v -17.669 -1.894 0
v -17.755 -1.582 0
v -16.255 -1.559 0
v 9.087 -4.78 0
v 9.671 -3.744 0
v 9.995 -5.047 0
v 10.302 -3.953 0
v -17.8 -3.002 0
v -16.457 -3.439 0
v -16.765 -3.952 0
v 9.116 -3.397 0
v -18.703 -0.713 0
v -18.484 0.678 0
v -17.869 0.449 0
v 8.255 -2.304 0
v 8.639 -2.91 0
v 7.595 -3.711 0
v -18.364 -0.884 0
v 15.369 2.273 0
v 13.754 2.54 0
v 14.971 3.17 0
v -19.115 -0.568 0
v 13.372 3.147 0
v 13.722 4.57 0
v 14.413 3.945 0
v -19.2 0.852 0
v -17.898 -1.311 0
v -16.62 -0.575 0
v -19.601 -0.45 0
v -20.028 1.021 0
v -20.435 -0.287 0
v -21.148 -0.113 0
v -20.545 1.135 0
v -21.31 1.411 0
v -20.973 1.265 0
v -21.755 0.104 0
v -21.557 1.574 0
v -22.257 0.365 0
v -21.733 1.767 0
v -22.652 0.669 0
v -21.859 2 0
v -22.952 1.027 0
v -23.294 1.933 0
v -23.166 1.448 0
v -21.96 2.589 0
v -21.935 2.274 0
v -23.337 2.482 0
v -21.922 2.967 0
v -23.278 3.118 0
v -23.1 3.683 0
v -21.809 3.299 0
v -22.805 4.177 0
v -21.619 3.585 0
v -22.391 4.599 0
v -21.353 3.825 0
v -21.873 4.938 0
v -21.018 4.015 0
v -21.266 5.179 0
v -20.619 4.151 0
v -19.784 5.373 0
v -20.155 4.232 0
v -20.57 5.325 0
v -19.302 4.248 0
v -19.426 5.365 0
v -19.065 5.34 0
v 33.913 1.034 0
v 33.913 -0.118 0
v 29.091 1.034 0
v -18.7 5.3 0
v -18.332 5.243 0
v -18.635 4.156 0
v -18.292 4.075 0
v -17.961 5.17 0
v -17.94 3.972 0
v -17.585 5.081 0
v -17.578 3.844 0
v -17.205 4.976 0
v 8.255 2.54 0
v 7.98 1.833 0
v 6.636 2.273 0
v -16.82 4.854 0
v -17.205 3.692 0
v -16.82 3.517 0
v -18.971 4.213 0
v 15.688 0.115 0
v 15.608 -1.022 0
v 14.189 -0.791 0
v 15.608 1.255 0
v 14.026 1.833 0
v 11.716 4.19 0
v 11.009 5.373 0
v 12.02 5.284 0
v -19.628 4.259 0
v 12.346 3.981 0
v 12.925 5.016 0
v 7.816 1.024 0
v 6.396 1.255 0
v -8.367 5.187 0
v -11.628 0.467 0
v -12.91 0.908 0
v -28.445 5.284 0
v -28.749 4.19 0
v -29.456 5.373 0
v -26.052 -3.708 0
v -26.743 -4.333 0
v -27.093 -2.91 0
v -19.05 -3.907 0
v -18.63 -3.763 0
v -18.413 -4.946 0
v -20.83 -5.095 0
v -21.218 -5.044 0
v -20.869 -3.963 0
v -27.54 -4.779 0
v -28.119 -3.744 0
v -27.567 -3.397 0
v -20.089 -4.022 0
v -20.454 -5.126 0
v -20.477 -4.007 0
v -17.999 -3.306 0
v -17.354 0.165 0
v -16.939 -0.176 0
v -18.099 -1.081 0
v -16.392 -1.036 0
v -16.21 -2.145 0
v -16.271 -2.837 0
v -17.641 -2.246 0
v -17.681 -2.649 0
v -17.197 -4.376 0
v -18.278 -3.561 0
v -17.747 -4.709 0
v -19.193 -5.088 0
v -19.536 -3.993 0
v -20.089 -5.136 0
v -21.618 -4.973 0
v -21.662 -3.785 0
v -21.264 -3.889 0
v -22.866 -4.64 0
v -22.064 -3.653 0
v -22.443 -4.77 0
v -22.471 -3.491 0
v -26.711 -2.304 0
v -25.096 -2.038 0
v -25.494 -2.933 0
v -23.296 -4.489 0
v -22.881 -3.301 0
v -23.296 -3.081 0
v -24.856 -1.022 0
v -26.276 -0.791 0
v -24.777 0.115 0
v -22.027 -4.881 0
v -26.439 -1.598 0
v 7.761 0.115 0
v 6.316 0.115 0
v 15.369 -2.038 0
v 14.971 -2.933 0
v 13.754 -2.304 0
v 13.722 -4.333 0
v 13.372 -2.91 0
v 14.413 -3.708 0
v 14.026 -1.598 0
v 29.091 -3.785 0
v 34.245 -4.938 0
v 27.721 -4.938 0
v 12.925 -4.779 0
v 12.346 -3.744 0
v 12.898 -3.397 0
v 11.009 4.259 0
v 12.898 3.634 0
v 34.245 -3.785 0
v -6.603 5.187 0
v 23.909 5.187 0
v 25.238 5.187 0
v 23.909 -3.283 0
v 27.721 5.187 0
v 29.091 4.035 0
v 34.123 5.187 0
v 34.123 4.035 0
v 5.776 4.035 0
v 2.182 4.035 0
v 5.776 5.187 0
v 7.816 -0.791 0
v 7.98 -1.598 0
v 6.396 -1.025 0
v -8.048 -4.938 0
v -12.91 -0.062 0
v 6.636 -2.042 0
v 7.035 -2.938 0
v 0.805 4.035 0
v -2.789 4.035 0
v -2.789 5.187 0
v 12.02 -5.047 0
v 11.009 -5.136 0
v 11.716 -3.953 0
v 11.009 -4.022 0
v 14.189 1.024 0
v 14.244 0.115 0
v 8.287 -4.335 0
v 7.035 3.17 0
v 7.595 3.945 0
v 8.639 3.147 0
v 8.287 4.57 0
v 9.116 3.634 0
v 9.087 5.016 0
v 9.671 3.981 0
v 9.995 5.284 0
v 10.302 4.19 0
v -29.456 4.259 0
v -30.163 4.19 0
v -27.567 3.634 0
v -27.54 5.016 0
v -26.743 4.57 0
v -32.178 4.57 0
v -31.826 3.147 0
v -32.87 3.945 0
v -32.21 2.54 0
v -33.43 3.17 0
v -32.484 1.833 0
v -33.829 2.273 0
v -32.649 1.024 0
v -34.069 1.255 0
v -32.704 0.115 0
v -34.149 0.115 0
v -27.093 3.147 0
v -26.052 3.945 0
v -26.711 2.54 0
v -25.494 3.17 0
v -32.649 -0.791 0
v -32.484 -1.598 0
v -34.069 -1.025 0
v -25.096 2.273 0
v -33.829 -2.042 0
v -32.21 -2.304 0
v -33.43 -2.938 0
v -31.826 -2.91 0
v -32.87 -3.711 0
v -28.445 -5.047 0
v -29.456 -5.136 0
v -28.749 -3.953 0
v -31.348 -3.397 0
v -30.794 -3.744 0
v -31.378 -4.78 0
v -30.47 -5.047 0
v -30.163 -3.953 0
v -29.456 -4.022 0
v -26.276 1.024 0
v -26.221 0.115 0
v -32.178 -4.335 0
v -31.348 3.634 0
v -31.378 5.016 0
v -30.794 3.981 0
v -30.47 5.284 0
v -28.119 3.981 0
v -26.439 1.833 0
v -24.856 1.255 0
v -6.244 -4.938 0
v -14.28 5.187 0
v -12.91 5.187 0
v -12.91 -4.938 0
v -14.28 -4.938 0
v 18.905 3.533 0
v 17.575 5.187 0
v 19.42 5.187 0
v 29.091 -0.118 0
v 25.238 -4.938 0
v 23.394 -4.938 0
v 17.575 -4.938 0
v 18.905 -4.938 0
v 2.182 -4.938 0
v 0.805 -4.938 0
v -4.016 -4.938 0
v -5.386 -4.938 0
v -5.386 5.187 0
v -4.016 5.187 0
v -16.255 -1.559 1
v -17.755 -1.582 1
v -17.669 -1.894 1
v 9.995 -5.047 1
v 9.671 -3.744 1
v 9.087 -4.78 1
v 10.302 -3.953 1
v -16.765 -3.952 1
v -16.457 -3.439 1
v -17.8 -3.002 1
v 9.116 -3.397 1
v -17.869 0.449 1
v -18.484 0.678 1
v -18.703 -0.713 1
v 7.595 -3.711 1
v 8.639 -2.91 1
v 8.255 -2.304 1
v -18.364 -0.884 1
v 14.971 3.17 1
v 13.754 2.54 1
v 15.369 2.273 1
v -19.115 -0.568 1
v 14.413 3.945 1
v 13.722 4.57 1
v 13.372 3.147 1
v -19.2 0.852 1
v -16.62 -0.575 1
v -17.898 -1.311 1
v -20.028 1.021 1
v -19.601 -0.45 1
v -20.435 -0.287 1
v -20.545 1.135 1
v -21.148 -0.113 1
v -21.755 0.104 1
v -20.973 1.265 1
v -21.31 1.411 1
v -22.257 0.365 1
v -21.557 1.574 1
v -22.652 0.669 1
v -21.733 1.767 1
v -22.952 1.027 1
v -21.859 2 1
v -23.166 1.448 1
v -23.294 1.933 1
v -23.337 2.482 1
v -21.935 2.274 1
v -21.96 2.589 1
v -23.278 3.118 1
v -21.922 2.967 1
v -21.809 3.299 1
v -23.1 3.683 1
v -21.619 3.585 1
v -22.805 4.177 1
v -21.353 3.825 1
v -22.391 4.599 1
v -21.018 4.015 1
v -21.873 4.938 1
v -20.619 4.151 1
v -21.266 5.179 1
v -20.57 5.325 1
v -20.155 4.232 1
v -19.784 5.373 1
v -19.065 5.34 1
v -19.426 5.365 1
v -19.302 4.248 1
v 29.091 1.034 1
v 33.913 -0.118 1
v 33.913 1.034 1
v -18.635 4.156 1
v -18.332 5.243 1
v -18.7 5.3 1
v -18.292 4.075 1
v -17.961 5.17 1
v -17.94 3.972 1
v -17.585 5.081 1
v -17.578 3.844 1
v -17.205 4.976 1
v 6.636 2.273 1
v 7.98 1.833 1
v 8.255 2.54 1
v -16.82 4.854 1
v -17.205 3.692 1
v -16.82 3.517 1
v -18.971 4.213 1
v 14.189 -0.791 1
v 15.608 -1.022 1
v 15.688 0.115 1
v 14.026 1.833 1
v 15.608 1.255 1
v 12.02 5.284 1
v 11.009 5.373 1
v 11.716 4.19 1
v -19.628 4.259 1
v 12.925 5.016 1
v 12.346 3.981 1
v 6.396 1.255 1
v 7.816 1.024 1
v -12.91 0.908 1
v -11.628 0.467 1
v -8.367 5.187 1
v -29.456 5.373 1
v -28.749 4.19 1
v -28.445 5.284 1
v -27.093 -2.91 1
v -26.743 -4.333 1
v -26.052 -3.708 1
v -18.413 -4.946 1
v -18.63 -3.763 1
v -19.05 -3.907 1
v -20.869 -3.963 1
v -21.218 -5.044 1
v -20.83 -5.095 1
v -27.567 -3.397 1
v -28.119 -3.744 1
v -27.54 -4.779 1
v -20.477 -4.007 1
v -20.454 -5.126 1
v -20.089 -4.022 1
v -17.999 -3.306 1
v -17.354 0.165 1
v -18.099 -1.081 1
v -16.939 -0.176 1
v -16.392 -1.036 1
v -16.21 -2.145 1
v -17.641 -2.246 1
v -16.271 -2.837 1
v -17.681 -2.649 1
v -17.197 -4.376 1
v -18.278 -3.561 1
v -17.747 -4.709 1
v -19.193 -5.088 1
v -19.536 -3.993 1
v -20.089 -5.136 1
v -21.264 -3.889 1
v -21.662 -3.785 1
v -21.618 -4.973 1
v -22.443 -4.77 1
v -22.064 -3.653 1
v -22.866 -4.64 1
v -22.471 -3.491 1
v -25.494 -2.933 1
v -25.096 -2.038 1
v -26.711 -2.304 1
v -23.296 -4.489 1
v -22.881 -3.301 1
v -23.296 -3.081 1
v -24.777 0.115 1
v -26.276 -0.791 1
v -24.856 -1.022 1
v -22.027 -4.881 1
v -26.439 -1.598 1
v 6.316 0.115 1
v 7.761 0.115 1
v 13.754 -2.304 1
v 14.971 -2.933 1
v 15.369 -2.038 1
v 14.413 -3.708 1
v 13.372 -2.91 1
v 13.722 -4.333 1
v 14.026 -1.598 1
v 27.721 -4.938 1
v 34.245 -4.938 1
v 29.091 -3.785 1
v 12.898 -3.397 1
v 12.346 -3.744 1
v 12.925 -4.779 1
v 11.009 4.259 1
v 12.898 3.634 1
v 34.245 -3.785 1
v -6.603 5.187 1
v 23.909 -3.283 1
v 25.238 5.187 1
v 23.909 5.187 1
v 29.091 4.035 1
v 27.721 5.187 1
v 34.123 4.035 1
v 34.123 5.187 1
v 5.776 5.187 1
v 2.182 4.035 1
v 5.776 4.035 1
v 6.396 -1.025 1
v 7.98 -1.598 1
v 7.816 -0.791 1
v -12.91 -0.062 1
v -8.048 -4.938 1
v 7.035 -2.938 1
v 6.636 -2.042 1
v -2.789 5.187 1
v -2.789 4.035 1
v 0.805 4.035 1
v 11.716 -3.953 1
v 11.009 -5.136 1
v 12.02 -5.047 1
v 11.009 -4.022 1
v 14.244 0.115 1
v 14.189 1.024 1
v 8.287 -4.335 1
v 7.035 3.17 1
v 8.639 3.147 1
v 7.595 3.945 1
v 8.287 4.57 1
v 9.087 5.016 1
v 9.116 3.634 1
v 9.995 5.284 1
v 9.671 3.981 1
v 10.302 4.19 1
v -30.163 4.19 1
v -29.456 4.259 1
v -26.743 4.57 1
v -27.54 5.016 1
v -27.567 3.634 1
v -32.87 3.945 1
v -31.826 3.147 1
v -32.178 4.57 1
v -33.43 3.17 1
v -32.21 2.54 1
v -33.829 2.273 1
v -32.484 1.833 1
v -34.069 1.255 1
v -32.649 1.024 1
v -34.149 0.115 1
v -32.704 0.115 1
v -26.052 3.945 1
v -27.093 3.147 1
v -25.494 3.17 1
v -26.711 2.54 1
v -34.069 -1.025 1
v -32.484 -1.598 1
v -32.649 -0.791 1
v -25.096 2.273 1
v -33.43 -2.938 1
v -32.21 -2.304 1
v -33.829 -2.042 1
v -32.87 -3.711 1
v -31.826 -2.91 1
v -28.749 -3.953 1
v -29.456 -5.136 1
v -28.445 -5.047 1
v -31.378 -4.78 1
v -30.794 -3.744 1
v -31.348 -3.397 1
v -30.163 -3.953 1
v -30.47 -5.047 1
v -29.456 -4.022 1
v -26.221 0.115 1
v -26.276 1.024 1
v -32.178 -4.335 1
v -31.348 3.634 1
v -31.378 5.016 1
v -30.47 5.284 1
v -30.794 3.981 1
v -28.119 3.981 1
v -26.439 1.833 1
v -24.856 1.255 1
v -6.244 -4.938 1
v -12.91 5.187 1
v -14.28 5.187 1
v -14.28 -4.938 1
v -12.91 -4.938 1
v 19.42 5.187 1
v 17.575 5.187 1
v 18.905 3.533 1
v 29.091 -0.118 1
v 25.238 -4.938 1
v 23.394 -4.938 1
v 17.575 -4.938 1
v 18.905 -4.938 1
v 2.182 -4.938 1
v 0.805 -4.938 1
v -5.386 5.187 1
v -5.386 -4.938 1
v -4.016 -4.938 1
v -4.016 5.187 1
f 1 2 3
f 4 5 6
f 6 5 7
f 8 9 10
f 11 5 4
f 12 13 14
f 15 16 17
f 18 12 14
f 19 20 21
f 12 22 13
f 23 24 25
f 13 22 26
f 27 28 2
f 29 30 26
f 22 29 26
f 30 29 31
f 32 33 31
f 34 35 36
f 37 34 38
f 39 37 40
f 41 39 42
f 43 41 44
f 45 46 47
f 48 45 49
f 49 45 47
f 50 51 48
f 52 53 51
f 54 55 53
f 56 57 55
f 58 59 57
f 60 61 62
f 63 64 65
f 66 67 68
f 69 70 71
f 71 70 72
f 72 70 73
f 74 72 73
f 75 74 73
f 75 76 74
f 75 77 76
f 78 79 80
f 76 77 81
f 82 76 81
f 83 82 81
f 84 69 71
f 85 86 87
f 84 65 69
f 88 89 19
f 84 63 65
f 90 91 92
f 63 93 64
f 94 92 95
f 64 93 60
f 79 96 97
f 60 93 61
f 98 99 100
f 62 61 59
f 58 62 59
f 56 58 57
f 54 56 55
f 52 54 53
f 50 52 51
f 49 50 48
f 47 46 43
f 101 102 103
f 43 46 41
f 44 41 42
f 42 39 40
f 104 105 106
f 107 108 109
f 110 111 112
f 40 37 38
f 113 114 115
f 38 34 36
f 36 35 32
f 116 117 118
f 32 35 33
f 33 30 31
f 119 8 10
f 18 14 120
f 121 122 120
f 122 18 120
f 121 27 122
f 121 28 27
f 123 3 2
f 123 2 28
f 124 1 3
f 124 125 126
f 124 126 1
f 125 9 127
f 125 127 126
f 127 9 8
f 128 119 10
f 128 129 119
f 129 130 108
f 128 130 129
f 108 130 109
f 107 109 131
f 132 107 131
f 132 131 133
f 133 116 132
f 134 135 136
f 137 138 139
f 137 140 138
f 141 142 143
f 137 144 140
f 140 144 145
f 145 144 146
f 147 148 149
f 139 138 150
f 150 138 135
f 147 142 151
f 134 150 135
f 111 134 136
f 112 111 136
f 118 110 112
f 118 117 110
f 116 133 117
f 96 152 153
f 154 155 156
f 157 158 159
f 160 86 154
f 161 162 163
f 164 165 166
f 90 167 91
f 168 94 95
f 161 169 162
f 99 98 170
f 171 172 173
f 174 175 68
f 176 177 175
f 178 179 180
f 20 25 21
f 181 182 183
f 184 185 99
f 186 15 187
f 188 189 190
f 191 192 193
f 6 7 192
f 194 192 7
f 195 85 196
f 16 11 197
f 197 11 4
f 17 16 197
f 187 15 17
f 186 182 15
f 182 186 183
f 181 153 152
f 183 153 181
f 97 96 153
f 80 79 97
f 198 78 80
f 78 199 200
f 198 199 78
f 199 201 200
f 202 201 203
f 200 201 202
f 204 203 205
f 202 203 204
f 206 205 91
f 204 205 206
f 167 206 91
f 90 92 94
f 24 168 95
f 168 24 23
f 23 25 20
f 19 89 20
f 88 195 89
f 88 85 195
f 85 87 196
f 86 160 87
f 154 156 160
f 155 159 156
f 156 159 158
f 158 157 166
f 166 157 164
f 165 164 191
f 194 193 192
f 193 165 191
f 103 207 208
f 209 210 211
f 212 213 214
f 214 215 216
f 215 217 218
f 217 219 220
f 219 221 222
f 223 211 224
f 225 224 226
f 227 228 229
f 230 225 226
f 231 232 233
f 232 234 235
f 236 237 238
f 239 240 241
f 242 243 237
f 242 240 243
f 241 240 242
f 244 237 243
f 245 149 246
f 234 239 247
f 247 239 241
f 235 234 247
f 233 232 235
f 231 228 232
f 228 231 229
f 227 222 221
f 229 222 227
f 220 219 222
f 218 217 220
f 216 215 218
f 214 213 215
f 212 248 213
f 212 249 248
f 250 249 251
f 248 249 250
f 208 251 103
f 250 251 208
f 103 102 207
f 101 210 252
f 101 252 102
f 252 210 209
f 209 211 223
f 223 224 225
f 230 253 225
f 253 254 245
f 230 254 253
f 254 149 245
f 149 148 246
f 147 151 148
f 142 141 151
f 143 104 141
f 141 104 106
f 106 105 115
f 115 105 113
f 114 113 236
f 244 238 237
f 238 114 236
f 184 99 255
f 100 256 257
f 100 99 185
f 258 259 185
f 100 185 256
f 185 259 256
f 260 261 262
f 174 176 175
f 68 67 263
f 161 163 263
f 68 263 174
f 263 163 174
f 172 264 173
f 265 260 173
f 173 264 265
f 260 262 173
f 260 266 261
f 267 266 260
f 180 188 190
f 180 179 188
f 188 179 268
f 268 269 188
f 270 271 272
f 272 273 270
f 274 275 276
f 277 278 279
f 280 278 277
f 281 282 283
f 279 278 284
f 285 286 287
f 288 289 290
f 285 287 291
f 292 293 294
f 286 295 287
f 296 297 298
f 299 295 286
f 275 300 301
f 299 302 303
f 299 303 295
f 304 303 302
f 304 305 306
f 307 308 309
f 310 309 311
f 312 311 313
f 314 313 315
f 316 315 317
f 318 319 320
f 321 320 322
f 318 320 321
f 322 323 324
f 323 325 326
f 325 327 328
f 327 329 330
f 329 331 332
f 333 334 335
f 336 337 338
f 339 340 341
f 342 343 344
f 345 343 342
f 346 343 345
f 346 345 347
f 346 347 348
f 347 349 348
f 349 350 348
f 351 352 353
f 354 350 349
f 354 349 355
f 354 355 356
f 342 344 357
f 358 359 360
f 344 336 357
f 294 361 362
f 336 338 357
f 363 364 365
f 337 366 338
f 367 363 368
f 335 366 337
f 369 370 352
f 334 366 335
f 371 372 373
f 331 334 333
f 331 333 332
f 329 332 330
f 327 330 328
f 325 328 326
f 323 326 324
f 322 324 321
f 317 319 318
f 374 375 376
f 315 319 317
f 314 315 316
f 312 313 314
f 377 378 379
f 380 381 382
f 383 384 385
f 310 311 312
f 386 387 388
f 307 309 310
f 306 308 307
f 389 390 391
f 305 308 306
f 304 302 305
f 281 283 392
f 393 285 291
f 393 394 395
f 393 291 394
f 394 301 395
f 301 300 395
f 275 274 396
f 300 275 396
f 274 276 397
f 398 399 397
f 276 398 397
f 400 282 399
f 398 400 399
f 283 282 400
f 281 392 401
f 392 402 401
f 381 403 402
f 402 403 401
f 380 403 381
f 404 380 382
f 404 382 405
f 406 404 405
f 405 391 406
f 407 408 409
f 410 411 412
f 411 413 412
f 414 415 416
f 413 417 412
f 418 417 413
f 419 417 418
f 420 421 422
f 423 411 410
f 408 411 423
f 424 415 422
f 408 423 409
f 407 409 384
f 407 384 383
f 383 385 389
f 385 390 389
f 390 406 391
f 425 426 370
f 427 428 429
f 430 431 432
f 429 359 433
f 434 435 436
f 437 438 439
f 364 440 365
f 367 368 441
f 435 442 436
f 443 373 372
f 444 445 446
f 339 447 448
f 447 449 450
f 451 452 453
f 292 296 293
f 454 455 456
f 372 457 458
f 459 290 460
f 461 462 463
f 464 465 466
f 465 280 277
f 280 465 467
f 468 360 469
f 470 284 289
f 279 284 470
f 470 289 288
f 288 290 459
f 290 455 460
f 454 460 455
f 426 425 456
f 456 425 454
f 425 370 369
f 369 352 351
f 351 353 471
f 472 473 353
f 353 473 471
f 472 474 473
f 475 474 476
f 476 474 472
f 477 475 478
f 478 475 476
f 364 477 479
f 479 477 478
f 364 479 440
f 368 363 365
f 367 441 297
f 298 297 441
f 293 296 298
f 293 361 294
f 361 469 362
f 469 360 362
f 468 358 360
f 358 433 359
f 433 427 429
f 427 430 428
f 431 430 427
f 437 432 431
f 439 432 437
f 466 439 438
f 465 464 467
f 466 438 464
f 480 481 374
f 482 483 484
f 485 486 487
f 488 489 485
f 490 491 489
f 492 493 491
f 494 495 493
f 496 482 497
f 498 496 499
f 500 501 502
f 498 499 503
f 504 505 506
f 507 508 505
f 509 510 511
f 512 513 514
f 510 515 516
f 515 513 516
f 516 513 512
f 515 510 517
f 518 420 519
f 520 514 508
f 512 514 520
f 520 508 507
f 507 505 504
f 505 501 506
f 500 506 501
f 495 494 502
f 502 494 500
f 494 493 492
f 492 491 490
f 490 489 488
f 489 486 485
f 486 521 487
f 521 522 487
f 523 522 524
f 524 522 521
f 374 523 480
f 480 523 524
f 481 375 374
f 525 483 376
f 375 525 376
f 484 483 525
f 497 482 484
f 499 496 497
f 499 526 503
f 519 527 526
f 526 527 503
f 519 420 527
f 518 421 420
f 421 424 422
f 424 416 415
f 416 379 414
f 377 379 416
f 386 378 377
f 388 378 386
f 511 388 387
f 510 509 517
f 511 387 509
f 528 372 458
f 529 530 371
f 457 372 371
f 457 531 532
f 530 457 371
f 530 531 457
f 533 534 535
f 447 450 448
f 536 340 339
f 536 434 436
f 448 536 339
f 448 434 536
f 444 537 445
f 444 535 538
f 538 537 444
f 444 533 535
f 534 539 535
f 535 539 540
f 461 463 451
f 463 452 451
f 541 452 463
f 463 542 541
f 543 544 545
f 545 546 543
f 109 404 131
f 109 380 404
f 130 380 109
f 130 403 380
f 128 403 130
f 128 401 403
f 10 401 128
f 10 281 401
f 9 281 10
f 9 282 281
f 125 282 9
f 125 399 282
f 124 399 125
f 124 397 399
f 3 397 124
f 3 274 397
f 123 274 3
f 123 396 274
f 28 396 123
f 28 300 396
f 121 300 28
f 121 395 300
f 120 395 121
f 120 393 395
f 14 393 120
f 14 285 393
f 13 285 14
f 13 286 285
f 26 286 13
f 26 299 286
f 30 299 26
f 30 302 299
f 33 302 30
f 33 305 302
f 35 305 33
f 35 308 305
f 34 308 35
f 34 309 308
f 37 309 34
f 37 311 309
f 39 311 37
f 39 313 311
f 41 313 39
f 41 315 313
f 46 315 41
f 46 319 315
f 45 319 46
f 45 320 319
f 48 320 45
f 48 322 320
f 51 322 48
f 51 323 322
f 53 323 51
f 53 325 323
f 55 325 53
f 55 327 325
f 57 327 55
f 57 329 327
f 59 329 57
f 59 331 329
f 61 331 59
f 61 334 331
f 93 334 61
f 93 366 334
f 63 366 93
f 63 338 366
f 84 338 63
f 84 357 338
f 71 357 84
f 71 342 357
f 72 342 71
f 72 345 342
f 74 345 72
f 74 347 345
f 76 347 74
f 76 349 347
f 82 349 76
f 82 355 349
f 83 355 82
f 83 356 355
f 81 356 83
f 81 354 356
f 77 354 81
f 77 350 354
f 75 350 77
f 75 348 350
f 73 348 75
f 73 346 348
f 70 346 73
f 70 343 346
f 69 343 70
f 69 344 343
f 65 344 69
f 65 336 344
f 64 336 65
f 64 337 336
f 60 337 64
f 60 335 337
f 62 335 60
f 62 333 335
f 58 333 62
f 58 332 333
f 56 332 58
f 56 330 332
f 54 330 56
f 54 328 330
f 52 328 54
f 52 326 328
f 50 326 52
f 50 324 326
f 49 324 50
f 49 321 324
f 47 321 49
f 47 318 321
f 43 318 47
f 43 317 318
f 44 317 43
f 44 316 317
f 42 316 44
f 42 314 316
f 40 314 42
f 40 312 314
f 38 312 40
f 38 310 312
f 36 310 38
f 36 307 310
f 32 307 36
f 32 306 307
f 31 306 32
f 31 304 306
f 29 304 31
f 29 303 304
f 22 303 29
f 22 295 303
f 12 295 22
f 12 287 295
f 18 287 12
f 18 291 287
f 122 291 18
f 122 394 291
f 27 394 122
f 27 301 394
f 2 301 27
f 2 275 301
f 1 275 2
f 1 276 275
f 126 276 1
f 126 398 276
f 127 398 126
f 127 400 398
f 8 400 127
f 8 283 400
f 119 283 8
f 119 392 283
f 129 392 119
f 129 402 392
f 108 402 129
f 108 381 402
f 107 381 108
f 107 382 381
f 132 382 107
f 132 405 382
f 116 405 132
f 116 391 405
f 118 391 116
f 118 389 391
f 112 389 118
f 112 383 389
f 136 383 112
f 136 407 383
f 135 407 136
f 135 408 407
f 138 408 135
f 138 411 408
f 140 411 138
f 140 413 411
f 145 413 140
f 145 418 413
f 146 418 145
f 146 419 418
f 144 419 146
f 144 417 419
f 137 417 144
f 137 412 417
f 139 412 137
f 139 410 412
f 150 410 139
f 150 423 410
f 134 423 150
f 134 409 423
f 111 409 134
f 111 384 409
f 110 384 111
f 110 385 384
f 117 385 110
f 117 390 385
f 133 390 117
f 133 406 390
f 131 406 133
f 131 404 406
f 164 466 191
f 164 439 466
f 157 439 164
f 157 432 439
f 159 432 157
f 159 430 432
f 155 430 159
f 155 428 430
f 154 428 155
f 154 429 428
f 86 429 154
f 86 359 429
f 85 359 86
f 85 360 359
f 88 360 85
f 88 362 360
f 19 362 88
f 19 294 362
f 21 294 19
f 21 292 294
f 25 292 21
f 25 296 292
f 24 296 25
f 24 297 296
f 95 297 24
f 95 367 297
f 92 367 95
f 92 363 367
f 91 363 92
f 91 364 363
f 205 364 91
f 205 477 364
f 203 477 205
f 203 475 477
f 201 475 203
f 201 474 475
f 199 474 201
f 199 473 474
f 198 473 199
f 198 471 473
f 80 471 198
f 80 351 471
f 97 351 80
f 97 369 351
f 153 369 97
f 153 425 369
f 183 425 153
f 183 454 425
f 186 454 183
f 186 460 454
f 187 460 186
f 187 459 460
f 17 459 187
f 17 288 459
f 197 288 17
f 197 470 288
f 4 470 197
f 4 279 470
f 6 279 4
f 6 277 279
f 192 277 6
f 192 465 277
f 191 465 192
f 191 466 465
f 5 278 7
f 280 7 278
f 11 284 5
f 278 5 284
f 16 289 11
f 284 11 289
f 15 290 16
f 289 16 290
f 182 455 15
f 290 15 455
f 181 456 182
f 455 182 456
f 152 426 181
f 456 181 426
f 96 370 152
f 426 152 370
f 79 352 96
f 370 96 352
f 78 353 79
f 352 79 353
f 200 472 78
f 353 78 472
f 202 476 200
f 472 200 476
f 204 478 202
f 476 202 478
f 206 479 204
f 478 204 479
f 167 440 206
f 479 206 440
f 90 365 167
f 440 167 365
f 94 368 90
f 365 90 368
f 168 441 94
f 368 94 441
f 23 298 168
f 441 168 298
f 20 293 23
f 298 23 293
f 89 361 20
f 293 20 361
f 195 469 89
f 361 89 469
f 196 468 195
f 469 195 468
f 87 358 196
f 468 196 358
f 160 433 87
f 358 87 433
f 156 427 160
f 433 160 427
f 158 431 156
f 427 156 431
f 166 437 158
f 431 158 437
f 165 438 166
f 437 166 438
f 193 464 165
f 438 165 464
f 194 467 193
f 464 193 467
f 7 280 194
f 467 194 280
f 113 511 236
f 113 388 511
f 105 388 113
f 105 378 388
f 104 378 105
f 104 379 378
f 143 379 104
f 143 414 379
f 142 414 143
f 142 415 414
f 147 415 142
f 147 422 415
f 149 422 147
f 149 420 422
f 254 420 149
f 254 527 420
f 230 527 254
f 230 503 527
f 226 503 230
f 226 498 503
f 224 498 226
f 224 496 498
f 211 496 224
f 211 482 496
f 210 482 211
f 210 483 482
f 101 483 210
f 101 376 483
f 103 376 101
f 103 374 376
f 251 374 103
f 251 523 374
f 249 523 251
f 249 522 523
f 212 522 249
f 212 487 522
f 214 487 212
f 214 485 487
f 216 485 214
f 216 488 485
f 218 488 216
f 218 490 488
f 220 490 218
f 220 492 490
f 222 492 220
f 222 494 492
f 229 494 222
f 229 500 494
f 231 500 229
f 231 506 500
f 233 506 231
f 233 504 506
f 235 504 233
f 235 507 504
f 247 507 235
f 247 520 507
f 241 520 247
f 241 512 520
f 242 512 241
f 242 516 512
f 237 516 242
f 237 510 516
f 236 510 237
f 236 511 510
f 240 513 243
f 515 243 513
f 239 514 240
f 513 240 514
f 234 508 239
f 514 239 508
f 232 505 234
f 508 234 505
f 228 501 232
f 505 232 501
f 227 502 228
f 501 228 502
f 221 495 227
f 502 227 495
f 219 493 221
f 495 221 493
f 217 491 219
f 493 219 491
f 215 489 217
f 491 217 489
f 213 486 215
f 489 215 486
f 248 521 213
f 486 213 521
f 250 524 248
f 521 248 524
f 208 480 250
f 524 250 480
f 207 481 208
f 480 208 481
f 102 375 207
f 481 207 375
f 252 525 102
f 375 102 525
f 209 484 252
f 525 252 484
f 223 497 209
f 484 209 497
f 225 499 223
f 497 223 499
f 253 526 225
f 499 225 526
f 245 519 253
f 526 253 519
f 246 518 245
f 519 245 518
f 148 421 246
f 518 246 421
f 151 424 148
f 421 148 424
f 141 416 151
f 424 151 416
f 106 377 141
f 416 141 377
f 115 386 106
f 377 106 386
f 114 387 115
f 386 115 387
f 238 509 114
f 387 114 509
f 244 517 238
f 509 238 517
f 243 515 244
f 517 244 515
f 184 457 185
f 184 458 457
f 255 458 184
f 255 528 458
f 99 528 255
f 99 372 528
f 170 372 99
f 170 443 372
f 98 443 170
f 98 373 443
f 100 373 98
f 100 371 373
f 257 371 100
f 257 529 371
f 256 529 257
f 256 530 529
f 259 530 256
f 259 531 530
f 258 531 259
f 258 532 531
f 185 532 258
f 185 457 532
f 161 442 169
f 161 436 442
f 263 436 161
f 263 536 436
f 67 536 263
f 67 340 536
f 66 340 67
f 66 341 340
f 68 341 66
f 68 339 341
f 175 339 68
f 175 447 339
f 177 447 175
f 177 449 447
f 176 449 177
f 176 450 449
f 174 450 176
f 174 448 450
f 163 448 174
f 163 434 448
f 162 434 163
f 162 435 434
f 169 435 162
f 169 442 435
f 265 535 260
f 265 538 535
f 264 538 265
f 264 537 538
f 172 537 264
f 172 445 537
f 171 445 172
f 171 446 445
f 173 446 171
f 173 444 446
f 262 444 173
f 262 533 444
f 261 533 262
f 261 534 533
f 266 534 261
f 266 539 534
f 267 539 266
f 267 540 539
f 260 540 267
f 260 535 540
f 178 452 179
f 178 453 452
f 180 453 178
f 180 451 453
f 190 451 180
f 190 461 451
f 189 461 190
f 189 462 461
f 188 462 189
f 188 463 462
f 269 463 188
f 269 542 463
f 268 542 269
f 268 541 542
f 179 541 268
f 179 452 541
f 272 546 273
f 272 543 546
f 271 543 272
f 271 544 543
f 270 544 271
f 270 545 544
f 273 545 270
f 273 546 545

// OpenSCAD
module engraving(
    string = "OSKITONE",
    font = "Work Sans:style=Black",
    size = 10,
    bleed = 0,
    height = 1,
    center = true
) {
    linear_extrude(height = height) {
        offset(delta = bleed) {
            text(
                string,
                size = size,
                font = font,
                halign = center ? "center" : "left",
                valign = center ? "center" : "baseline"
            );
        }
    }
}

engraving();
